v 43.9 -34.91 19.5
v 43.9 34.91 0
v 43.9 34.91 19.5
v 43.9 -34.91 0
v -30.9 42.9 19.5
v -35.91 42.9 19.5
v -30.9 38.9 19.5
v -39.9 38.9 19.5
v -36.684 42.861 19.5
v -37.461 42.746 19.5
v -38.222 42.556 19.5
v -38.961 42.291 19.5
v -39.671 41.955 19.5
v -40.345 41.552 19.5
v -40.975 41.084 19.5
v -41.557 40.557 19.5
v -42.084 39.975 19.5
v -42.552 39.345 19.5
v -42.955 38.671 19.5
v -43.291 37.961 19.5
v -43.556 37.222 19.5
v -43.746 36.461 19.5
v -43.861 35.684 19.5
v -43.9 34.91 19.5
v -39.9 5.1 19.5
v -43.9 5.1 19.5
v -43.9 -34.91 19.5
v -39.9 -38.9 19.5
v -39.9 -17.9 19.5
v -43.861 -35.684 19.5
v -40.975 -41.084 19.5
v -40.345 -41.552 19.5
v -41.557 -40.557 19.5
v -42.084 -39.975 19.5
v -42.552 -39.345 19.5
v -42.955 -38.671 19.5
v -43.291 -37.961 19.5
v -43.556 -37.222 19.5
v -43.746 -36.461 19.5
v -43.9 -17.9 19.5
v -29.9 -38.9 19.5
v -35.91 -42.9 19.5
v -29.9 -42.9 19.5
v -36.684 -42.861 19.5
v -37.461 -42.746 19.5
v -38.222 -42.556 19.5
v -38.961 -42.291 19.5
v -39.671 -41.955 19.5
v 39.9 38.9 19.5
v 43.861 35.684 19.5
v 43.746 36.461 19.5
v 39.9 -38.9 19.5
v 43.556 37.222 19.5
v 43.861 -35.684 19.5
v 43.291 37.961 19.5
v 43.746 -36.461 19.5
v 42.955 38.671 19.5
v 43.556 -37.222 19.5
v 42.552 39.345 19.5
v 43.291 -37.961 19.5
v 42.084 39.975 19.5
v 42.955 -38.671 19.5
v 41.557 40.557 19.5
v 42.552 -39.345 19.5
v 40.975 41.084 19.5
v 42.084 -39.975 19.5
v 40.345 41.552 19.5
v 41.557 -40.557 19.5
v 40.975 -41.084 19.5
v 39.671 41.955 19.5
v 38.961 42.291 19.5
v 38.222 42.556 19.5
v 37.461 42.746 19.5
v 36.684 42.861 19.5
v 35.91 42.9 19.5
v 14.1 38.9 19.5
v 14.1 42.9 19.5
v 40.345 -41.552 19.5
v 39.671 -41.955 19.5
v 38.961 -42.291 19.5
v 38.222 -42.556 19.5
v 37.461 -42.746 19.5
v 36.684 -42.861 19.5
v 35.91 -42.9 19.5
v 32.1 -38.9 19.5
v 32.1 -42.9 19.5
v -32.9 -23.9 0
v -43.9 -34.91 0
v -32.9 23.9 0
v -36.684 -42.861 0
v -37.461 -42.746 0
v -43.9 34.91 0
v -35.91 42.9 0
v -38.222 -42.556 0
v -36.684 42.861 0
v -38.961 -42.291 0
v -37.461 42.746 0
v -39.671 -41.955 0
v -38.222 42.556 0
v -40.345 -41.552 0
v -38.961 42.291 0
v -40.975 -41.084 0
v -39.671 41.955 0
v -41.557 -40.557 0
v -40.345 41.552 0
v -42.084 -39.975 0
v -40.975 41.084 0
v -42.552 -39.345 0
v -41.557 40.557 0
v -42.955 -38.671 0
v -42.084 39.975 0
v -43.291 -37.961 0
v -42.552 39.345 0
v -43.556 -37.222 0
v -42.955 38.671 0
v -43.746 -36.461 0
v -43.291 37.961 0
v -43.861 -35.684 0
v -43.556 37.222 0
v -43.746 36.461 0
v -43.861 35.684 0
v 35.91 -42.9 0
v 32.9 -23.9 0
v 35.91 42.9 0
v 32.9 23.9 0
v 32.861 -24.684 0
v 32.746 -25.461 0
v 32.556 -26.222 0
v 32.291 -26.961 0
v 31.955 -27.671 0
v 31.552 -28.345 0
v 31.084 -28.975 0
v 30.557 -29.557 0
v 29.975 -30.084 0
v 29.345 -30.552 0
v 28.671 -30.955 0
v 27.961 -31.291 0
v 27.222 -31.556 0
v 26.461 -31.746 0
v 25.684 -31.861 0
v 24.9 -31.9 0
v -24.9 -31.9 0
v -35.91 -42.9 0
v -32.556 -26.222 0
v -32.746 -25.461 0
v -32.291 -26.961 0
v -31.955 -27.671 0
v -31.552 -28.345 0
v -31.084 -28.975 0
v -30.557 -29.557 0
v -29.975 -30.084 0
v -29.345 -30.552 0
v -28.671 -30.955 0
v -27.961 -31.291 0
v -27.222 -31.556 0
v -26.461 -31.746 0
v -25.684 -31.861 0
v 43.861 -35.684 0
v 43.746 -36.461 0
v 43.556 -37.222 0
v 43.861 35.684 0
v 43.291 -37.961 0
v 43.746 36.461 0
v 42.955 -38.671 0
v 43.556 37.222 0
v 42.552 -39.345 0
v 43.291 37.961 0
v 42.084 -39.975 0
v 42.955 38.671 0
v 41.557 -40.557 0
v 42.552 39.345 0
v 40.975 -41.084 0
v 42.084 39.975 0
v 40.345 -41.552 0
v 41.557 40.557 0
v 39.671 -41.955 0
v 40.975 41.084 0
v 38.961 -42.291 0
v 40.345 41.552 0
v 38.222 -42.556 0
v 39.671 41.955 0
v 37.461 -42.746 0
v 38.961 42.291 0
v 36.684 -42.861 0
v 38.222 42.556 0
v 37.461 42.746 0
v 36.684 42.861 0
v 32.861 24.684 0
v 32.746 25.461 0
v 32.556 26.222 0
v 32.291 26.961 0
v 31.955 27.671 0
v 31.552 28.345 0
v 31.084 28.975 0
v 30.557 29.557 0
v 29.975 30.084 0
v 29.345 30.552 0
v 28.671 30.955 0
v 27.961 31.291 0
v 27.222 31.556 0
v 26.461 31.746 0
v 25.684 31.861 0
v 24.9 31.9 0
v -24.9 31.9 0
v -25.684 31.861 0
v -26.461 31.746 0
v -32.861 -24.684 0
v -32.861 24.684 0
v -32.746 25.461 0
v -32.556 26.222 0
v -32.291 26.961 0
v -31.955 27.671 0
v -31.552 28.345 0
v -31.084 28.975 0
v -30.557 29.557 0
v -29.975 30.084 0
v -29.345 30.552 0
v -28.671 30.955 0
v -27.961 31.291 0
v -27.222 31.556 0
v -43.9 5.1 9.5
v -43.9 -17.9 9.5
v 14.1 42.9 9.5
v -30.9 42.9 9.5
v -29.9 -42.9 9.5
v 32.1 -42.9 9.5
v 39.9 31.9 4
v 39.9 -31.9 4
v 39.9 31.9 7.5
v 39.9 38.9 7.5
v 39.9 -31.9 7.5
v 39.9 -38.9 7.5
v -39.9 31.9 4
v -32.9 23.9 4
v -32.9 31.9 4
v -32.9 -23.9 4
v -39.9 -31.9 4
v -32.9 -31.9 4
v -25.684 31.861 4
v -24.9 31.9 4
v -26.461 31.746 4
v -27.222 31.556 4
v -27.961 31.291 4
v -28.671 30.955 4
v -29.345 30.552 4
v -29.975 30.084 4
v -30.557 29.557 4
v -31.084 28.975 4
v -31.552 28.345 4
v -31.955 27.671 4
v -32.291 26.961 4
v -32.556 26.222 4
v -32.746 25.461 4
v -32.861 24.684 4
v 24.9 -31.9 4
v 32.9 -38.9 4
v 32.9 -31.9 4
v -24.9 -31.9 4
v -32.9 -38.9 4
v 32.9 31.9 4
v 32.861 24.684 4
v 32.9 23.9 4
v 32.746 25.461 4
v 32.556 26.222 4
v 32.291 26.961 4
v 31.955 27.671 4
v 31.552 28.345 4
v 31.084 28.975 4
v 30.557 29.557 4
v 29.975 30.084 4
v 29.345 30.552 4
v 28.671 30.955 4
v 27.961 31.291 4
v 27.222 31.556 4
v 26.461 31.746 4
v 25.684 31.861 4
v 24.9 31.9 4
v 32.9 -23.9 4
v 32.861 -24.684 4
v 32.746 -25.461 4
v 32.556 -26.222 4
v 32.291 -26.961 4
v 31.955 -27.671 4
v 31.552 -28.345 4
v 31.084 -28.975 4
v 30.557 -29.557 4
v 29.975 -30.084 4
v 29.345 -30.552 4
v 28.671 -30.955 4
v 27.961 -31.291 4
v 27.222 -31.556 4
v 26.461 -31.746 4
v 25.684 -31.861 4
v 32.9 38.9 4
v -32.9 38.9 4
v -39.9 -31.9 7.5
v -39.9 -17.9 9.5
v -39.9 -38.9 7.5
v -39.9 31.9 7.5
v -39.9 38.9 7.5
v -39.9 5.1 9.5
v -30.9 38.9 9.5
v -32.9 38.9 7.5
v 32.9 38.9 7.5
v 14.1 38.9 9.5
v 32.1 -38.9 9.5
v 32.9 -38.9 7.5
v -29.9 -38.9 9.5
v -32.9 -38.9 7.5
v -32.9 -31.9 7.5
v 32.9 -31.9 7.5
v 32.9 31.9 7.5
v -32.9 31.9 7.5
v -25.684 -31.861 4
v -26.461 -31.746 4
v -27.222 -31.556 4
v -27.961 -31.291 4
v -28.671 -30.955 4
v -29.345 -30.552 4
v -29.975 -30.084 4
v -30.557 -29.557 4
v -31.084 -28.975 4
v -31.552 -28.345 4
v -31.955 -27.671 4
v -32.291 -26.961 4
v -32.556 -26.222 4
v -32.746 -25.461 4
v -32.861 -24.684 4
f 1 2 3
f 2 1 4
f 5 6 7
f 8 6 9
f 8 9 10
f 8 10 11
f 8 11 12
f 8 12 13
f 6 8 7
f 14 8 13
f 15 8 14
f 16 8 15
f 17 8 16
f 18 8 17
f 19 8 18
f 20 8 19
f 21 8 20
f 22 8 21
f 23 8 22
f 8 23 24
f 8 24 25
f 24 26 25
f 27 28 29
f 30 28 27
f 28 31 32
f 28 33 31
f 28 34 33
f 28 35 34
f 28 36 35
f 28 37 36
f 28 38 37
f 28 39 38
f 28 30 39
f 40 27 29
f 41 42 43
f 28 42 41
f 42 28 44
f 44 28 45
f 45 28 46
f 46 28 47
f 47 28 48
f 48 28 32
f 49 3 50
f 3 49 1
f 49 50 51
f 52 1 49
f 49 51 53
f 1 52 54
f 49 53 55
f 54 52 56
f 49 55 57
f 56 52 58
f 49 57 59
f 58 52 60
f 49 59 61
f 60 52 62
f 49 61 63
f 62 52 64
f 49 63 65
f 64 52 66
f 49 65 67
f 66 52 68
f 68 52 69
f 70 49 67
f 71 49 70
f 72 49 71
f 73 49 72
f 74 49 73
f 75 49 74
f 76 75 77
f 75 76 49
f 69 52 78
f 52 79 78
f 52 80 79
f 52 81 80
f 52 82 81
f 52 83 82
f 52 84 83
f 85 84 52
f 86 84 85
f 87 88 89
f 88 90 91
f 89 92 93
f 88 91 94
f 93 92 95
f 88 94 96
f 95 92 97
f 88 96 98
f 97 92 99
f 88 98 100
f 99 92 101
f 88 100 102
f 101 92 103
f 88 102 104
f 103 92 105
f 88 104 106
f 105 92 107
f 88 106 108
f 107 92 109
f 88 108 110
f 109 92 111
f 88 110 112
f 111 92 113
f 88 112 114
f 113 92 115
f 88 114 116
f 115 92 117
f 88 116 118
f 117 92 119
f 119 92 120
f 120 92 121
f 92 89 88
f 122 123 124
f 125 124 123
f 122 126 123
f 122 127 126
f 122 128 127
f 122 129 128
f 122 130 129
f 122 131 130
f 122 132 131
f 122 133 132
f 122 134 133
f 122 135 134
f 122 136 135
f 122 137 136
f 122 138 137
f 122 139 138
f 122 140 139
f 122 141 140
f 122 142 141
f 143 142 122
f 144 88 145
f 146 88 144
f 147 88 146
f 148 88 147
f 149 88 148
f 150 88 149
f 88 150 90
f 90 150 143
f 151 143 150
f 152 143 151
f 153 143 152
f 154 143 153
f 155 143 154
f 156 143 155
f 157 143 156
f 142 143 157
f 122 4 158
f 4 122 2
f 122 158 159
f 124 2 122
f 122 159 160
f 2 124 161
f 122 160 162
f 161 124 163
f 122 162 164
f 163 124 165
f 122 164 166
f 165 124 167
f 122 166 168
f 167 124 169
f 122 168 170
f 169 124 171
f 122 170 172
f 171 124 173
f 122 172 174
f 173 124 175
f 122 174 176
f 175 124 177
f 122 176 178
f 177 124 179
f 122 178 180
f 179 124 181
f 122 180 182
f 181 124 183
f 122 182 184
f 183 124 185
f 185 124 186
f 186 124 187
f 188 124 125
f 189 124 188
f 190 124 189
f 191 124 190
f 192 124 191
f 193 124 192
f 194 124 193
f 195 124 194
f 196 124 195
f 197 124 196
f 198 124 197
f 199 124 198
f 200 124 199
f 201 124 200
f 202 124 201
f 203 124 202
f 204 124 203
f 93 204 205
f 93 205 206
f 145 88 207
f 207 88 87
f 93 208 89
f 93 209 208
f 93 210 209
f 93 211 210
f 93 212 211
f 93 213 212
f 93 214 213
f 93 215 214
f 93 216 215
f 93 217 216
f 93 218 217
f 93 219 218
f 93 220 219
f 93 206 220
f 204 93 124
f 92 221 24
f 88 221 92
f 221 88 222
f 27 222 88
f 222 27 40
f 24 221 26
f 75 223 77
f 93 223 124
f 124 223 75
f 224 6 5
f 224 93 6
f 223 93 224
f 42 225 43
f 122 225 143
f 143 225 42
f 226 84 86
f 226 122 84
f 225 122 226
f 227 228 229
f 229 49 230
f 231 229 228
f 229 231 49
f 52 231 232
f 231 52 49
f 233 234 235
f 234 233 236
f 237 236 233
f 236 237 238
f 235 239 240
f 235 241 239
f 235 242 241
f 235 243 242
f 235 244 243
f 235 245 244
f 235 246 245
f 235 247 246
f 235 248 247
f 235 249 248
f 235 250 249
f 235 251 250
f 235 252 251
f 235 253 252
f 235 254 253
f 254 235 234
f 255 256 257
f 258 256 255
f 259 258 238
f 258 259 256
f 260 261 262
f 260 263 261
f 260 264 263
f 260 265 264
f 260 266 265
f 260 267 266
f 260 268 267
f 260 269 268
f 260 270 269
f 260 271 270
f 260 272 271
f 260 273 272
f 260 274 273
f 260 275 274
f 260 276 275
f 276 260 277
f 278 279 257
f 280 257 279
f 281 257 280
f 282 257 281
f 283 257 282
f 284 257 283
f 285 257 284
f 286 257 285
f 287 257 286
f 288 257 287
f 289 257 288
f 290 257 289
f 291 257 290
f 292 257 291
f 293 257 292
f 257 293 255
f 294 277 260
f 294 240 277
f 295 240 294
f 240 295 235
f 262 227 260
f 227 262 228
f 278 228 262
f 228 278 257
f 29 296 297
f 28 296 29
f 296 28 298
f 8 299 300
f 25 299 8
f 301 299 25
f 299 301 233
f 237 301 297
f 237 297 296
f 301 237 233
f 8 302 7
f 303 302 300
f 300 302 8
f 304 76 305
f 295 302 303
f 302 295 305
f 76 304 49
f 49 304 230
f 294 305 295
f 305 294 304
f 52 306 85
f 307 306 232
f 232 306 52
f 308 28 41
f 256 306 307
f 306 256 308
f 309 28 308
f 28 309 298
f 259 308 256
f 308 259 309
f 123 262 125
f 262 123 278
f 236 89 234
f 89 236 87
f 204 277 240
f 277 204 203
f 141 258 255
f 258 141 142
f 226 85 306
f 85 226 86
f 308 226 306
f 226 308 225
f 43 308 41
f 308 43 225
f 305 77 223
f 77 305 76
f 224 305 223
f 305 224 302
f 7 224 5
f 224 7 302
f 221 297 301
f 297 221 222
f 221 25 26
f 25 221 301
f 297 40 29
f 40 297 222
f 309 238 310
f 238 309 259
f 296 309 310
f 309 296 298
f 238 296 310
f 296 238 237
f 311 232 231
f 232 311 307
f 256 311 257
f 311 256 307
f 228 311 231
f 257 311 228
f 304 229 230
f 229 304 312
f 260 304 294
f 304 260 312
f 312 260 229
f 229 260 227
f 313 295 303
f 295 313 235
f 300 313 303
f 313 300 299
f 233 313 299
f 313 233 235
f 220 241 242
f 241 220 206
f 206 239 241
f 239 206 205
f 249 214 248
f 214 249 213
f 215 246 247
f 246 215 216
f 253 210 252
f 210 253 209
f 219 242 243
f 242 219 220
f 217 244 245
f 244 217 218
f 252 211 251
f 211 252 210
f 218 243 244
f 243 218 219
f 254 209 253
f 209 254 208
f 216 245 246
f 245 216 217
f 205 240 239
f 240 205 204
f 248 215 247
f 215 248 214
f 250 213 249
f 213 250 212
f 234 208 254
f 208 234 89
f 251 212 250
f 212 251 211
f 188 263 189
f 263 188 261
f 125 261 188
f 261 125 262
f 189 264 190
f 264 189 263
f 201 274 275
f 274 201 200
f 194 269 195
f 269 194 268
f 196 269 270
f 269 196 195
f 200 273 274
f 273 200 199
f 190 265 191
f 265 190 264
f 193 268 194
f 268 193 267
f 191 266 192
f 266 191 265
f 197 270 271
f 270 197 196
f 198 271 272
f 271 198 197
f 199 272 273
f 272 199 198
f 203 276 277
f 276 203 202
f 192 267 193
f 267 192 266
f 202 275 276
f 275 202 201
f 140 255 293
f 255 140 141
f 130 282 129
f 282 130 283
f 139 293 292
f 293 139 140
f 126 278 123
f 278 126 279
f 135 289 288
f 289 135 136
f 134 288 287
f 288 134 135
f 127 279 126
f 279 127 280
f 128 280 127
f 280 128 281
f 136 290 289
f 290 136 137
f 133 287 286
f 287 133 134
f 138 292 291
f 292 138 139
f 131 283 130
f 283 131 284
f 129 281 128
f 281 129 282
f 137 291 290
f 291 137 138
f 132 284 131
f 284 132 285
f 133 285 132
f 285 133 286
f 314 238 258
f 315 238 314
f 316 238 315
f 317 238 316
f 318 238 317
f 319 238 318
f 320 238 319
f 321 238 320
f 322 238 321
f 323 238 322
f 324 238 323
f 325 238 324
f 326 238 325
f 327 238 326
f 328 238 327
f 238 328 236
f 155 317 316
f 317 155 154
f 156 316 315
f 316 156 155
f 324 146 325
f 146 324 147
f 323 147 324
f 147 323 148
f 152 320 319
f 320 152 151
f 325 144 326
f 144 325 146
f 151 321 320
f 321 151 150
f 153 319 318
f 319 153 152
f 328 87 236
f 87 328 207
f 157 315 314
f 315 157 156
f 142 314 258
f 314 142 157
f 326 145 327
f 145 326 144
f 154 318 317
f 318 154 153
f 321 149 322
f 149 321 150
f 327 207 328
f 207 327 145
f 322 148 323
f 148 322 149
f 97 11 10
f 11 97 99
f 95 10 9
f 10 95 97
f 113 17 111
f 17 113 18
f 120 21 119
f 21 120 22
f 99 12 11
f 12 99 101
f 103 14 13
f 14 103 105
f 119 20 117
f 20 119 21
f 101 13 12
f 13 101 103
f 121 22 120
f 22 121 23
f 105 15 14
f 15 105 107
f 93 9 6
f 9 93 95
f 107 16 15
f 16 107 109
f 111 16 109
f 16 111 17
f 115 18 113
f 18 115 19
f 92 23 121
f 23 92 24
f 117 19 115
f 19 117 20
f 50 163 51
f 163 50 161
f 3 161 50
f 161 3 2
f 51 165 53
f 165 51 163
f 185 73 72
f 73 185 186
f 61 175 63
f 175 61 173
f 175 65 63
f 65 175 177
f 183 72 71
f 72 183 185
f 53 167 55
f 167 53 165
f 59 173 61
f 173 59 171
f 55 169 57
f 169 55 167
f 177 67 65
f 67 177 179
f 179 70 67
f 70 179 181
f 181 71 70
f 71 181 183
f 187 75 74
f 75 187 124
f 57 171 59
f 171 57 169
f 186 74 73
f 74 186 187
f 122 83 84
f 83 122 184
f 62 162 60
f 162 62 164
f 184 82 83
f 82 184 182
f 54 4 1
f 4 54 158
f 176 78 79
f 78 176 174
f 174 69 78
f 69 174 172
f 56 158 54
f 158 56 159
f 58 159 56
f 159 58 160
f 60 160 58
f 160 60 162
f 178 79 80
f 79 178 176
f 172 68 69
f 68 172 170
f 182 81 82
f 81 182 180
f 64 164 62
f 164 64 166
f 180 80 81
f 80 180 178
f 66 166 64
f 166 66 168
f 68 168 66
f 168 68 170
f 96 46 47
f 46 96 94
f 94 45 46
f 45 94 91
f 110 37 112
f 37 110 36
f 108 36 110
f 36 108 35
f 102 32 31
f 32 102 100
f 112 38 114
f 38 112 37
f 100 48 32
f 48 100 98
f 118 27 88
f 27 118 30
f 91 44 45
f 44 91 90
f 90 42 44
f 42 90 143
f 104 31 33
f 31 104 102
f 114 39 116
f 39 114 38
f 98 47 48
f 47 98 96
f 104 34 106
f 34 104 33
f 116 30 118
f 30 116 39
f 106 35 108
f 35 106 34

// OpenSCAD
// Box for beagleboard, (c) 2010 - Koen Kooi, licensed under CC-BY-SA

// lenght of PCB
inside_length = 77.8;

// width of PCB
inside_w = 79.8;

// outside wall thickness
edge_thickness = 4;
stud_height = edge_thickness + 3.5;

// Set this to zero have a 'coaster' instead of a box
extra_height = 10;

// stud is inside the wall but aligned to the bottom, 
// so its stud_size x stud_size x (stud_height - edge_thickness) big
stud_size = 7;
pcb_thickness = 2;

// Round the inside and outside corners
use_rounded_corners = 1; // 0,1

inside_corner_radius = 8;
corner_radius = 8;

box_width = inside_w + (edge_thickness * 2); 
box_length = inside_length + (edge_thickness * 2);
box_height = stud_height + pcb_thickness + extra_height;

translate(v = [ -box_width / 2, -box_length / 2, 0]) {   
  if(use_rounded_corners == 1) {
    roundedbox(box_width, box_length, box_height, edge_thickness, stud_size);
  } else {
    plainbox(box_width, box_length, box_height, edge_thickness, stud_size);
  }
}

module plainbox(box_width, box_length, box_height, edge_thickness, stud_size) {
  union() {
    difference() {
      //outside
      cube([box_width, box_length, box_height]);
      //inside
      translate(v = [edge_thickness, edge_thickness, edge_thickness]) {  
        cube([inside_w, inside_length, box_height]);
      }
      translate(v = [stud_size + edge_thickness, stud_size + edge_thickness, -edge_thickness]) {  
        cube([inside_w - 2 * stud_size, inside_length - 2 * stud_size, box_height]);
      }
      //audio: 62mm long, 10mm corner offset
      translate(v = [10 + edge_thickness, -0.01, stud_height + pcb_thickness]) {
        cube([62, edge_thickness + 0.02, extra_height + 0.01], center=false);
      }
      //sd: 45mm long, 9mm corner offset
      translate(v = [9 + edge_thickness, box_length - edge_thickness - 0.01, stud_height + pcb_thickness]) {
        cube([45, edge_thickness + 0.02, extra_height + 0.01], center=false);
      }
      //power: 23mm long, 21mm corner offset
      translate(v = [-0.01, 21 + edge_thickness, stud_height + pcb_thickness]) {
        cube([edge_thickness + 0.02, 23, extra_height + 0.01], center=false);
      }
    } // end difference
    //support studs
    translate(v = [edge_thickness, edge_thickness, 0]) {
      cube([stud_size, stud_size, stud_height], center = false);
    }
    translate(v = [box_width - stud_size - edge_thickness, edge_thickness, 0]) {
      cube([stud_size, stud_size, stud_height], center = false);
    }
    translate(v = [box_width - stud_size - edge_thickness, box_length - stud_size - edge_thickness, 0]) {
      cube([stud_size, stud_size, stud_height], center = false);
    }
    translate(v = [edge_thickness, box_length - stud_size - edge_thickness, 0]) {
      cube([stud_size, stud_size, stud_height], center = false);
    }
  } // end union
}

module roundedbox(box_width, box_length, box_height, edge_thickness, stud_size) {
  difference() {
    union() {
      plainbox(box_width, box_length, box_height, edge_thickness, stud_size);
  
        //rounded corner topleft
        translate(v = [edge_thickness + stud_size, box_length - edge_thickness - stud_size, 0]) {
          difference() {
            translate(v=[0,-inside_corner_radius,0]) {
              cube([inside_corner_radius,inside_corner_radius,edge_thickness]);
            }
            translate(v=[inside_corner_radius, -inside_corner_radius, -edge_thickness]) {
              cylinder(r=inside_corner_radius, h=3*edge_thickness, $fn=64);
            }
          }
        }
        //rounded corner topright
        translate(v = [box_width - edge_thickness - stud_size, box_length - edge_thickness - stud_size, 0]) {
          difference() {
            translate(v=[-inside_corner_radius,-inside_corner_radius,0]) {
              cube([inside_corner_radius,inside_corner_radius,edge_thickness]);
            }
            translate(v=[-inside_corner_radius, -inside_corner_radius, -edge_thickness]) {
              cylinder(r=inside_corner_radius, h=3*edge_thickness, $fn=64);
            }
          }
        }
        //rounded corner bottomright
        translate(v = [box_width - edge_thickness - stud_size, edge_thickness + stud_size, 0]) {
          difference() {
            translate(v=[-inside_corner_radius,0,0]) {
              cube([inside_corner_radius,inside_corner_radius,edge_thickness]);
            }
            translate(v=[-inside_corner_radius, inside_corner_radius, -edge_thickness]) {
              cylinder(r=inside_corner_radius, h=3*edge_thickness, $fn=64);
            }
          }
        }
        //rounded corner bottomleft
        translate(v = [edge_thickness + stud_size, edge_thickness + stud_size, 0]) {
          difference() {
            translate(v=[0,0,0]) {
              cube([inside_corner_radius,inside_corner_radius,edge_thickness]);
            }
            translate(v=[inside_corner_radius, inside_corner_radius, -edge_thickness]) {
              cylinder(r=inside_corner_radius, h=3*edge_thickness, $fn=64);
            }
          }
        }
    } //end union

    //rounded corner topleft
    translate(v = [0, box_length, 0]) {
      difference() {
        translate(v=[0 - 0.01,-corner_radius + 0.01, -0.5 * box_height]) {
          cube([corner_radius,corner_radius,2*box_height]);
        }
        translate(v=[corner_radius, -corner_radius, -0.5 * box_height]) {
          cylinder(r=corner_radius, h=2*box_height, $fn=64);
        }
      }
    }
    //rounded corner topright
    translate(v = [box_width, box_length, 0]) {
      difference() {
        translate(v=[-corner_radius + 0.01,-corner_radius + 0.01, -0.5 * box_height]) {
          cube([corner_radius,corner_radius,2*box_height]);
        }
        translate(v=[-corner_radius, -corner_radius, -0.5 * box_height]) {
          cylinder(r=corner_radius, h=2*box_height, $fn=64);
        }
      }
    }
    //rounded corner bottomright
    translate(v = [box_width, 0, 0]) {
      difference() {
        translate(v=[-corner_radius + 0.01,0 - 0.01, -0.5 * box_height]) {
          cube([corner_radius,corner_radius,2*box_height]);
        }
        translate(v=[-corner_radius, corner_radius, -0.5 * box_height]) {
          cylinder(r=corner_radius, h=2*box_height, $fn=64);
        }
      }
    }
    //rounded corner bottomleft
    translate(v = [0, 0, 0]) {
      difference() {
        translate(v=[0-0.01, -0.01, -0.5 * box_height]) {
          cube([corner_radius ,corner_radius,2*box_height]);
        }
        translate(v=[corner_radius, corner_radius, -0.5 * box_height]) {
          cylinder(r=corner_radius, h=2*box_height, $fn=64);
        }
      }
    }
  } //end difference
}
